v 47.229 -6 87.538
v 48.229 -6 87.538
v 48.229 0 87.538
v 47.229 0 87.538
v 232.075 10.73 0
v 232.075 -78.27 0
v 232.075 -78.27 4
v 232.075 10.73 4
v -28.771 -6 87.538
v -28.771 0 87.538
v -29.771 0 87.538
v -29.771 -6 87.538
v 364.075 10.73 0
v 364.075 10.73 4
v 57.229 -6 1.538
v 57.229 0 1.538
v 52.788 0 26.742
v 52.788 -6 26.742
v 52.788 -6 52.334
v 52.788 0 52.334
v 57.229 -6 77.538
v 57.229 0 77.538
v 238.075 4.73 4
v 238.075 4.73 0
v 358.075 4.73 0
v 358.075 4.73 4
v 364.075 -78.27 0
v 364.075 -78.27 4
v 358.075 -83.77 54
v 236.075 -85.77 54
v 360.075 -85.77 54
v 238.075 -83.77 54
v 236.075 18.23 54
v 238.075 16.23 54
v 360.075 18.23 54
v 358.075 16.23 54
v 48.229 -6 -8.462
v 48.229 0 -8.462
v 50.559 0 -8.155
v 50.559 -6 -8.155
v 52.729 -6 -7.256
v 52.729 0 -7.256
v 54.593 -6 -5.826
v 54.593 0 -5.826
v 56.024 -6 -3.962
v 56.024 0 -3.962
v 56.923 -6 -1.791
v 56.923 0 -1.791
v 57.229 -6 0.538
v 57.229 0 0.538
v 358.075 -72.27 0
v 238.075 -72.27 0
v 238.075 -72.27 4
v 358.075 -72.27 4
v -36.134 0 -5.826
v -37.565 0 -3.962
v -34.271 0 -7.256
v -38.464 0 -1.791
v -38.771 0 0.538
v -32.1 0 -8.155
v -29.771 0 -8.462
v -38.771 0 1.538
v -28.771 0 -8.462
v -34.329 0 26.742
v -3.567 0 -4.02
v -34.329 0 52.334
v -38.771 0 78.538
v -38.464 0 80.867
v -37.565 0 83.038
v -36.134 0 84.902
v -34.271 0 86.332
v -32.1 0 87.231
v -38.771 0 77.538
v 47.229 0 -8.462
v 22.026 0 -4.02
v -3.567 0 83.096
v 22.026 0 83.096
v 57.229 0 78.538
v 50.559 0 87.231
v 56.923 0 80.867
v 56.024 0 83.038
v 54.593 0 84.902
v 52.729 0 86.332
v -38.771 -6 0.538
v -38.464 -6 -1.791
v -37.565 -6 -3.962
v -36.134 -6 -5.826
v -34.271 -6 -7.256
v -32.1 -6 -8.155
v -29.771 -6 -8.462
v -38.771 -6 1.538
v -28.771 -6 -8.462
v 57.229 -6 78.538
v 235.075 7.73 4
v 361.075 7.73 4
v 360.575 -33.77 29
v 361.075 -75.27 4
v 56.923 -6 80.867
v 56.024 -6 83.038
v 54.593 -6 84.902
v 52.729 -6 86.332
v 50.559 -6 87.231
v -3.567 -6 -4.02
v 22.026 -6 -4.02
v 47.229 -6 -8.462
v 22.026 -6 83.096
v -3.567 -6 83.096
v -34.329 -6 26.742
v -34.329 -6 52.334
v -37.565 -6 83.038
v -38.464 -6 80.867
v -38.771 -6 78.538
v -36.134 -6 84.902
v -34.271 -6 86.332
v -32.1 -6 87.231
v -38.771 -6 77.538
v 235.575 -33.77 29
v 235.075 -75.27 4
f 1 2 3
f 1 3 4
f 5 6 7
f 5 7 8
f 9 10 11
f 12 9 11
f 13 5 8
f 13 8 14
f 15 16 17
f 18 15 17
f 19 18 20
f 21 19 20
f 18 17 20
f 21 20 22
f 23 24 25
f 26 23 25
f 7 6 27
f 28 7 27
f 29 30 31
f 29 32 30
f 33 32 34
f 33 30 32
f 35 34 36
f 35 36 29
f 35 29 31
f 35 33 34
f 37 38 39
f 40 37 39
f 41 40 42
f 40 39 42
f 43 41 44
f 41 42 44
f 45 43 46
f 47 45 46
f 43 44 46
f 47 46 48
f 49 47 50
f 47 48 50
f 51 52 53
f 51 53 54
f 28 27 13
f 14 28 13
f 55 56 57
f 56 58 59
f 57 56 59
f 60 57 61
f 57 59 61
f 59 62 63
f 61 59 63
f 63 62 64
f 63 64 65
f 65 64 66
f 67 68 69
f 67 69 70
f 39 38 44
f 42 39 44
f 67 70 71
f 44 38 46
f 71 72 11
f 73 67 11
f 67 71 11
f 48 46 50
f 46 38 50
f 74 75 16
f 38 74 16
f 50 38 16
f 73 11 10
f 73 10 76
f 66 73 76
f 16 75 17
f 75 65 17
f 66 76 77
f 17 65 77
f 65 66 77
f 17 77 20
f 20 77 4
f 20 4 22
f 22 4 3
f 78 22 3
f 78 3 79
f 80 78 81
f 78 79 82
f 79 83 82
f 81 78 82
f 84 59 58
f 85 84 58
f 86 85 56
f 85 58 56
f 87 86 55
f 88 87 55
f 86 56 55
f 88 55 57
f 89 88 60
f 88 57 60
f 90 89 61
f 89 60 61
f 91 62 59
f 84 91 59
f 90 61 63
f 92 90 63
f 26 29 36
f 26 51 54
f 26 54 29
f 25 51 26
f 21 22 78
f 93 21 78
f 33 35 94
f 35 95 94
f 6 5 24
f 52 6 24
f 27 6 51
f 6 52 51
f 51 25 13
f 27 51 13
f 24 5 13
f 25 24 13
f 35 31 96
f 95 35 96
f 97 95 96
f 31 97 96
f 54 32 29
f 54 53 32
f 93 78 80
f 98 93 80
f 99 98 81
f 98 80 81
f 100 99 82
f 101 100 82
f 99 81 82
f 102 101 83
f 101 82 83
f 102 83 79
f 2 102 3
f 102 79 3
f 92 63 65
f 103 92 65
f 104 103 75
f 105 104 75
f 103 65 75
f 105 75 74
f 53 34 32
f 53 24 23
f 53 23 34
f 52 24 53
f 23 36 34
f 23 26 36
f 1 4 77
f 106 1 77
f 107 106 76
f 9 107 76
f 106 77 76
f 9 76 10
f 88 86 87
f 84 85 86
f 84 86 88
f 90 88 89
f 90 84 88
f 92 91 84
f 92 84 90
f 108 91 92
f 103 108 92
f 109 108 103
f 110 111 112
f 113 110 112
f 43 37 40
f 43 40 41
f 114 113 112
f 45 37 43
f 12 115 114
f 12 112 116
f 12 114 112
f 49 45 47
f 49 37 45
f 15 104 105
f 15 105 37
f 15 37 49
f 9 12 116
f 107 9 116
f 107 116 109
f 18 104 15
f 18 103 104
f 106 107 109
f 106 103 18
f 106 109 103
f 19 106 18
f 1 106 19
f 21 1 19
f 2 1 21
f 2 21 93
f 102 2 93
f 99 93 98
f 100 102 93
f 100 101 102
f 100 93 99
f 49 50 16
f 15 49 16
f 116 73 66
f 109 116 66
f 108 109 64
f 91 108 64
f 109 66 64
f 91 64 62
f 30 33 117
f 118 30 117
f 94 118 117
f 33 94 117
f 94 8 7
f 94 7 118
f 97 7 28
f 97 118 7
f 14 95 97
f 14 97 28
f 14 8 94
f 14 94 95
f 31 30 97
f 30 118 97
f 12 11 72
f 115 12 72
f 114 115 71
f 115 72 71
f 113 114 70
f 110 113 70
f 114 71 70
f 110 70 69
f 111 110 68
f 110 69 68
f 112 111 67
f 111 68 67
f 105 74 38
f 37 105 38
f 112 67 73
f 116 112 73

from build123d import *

# Parameters (mm, degrees)
F1_DEPTH  = 6
F2_W      = 132
F2_H      = 89
F2_W_2    = 120
F2_H_2    = 77
F3_DEPTH  = 4
F5_W      = 124
F5_H      = 104
F6_W      = 126
F6_H      = 83
F8_W      = 120
F8_H      = 100
F7_FACE_W = 120
F7_FACE_H = 77


with BuildPart() as f1:
    # F0 (on Front) → F1 (new body)
    with BuildSketch(Plane.XZ):
        with BuildLine():
            ThreePointArc((-38.7705280386, 0.5379956365), (-36.1344890693, -5.8259653942), (-29.7705280386, -8.4620043635))
            Line((-29.7705280386, -8.4620043635), (-28.7705280386, -8.4620043635))
            ThreePointArc((-28.7705280386, -8.4620043635), (9.2294719614, -3.4620043635), (47.2294719614, -8.4620043635))
            Line((47.2294719614, -8.4620043635), (48.2294719614, -8.4620043635))
            ThreePointArc((48.2294719614, -8.4620043635), (54.5934329921, -5.8259653942), (57.2294719614, 0.5379956365))
            Line((57.2294719614, 0.5379956365), (57.2294719614, 1.5379956365))
            ThreePointArc((57.2294719614, 1.5379956365), (52.2294719614, 39.5379956365), (57.2294719614, 77.5379956365))
            Line((57.2294719614, 77.5379956365), (57.2294719614, 78.5379956365))
            ThreePointArc((57.2294719614, 78.5379956365), (54.5934329921, 84.9019566671), (48.2294719614, 87.5379956365))
            Line((48.2294719614, 87.5379956365), (47.2294719614, 87.5379956365))
            ThreePointArc((47.2294719614, 87.5379956365), (9.2294719614, 82.5379956365), (-28.7705280386, 87.5379956365))
            Line((-28.7705280386, 87.5379956365), (-29.7705280386, 87.5379956365))
            ThreePointArc((-29.7705280386, 87.5379956365), (-36.1344890693, 84.9019566671), (-38.7705280386, 78.5379956365))
            Line((-38.7705280386, 78.5379956365), (-38.7705280386, 77.5379956365))
            ThreePointArc((-38.7705280386, 77.5379956365), (-33.7705280386, 39.5379956365), (-38.7705280386, 1.5379956365))
            Line((-38.7705280386, 1.5379956365), (-38.7705280386, 0.5379956365))
        make_face()
    extrude(amount=F1_DEPTH)


with BuildPart() as f3:
    # F2 (on Top) → F3 (new body)
    with BuildSketch(Plane.XY):
        with Locations((298.0748858452, -33.7703375444)):
            Rectangle(F2_W, F2_H)
        with Locations((298.0748858452, -33.7703375444)):
            Rectangle(F2_W_2, F2_H_2, mode=Mode.SUBTRACT)
    extrude(amount=F3_DEPTH)

    # F5 (on offset) → F7 section 0
    with BuildSketch(Plane.XY.offset(54)):
        with Locations((298.0748858452, -33.7703375444)):
            Rectangle(F5_W, F5_H)
    # F6 (on face) → F7 section 1
    with BuildSketch(Plane.XY.offset(4)):
        with Locations((298.0748858452, -33.7703375444)):
            Rectangle(F6_W, F6_H)
    loft()

    # F8 (on face) → F9 section 0
    with BuildSketch(Plane.XY.offset(54)):
        with Locations((298.0748858452, -33.7703375444)):
            Rectangle(F8_W, F8_H)
    # F7_face (on face) → F9 section 1
    with BuildSketch(Plane(origin=(298.0748858452, -33.7703375444, 4), x_dir=(1, 0, 0), z_dir=(0, 0, -1))):
        Rectangle(F7_FACE_W, F7_FACE_H)
    loft(mode=Mode.SUBTRACT)


solid = Compound([f1.part, f3.part])
